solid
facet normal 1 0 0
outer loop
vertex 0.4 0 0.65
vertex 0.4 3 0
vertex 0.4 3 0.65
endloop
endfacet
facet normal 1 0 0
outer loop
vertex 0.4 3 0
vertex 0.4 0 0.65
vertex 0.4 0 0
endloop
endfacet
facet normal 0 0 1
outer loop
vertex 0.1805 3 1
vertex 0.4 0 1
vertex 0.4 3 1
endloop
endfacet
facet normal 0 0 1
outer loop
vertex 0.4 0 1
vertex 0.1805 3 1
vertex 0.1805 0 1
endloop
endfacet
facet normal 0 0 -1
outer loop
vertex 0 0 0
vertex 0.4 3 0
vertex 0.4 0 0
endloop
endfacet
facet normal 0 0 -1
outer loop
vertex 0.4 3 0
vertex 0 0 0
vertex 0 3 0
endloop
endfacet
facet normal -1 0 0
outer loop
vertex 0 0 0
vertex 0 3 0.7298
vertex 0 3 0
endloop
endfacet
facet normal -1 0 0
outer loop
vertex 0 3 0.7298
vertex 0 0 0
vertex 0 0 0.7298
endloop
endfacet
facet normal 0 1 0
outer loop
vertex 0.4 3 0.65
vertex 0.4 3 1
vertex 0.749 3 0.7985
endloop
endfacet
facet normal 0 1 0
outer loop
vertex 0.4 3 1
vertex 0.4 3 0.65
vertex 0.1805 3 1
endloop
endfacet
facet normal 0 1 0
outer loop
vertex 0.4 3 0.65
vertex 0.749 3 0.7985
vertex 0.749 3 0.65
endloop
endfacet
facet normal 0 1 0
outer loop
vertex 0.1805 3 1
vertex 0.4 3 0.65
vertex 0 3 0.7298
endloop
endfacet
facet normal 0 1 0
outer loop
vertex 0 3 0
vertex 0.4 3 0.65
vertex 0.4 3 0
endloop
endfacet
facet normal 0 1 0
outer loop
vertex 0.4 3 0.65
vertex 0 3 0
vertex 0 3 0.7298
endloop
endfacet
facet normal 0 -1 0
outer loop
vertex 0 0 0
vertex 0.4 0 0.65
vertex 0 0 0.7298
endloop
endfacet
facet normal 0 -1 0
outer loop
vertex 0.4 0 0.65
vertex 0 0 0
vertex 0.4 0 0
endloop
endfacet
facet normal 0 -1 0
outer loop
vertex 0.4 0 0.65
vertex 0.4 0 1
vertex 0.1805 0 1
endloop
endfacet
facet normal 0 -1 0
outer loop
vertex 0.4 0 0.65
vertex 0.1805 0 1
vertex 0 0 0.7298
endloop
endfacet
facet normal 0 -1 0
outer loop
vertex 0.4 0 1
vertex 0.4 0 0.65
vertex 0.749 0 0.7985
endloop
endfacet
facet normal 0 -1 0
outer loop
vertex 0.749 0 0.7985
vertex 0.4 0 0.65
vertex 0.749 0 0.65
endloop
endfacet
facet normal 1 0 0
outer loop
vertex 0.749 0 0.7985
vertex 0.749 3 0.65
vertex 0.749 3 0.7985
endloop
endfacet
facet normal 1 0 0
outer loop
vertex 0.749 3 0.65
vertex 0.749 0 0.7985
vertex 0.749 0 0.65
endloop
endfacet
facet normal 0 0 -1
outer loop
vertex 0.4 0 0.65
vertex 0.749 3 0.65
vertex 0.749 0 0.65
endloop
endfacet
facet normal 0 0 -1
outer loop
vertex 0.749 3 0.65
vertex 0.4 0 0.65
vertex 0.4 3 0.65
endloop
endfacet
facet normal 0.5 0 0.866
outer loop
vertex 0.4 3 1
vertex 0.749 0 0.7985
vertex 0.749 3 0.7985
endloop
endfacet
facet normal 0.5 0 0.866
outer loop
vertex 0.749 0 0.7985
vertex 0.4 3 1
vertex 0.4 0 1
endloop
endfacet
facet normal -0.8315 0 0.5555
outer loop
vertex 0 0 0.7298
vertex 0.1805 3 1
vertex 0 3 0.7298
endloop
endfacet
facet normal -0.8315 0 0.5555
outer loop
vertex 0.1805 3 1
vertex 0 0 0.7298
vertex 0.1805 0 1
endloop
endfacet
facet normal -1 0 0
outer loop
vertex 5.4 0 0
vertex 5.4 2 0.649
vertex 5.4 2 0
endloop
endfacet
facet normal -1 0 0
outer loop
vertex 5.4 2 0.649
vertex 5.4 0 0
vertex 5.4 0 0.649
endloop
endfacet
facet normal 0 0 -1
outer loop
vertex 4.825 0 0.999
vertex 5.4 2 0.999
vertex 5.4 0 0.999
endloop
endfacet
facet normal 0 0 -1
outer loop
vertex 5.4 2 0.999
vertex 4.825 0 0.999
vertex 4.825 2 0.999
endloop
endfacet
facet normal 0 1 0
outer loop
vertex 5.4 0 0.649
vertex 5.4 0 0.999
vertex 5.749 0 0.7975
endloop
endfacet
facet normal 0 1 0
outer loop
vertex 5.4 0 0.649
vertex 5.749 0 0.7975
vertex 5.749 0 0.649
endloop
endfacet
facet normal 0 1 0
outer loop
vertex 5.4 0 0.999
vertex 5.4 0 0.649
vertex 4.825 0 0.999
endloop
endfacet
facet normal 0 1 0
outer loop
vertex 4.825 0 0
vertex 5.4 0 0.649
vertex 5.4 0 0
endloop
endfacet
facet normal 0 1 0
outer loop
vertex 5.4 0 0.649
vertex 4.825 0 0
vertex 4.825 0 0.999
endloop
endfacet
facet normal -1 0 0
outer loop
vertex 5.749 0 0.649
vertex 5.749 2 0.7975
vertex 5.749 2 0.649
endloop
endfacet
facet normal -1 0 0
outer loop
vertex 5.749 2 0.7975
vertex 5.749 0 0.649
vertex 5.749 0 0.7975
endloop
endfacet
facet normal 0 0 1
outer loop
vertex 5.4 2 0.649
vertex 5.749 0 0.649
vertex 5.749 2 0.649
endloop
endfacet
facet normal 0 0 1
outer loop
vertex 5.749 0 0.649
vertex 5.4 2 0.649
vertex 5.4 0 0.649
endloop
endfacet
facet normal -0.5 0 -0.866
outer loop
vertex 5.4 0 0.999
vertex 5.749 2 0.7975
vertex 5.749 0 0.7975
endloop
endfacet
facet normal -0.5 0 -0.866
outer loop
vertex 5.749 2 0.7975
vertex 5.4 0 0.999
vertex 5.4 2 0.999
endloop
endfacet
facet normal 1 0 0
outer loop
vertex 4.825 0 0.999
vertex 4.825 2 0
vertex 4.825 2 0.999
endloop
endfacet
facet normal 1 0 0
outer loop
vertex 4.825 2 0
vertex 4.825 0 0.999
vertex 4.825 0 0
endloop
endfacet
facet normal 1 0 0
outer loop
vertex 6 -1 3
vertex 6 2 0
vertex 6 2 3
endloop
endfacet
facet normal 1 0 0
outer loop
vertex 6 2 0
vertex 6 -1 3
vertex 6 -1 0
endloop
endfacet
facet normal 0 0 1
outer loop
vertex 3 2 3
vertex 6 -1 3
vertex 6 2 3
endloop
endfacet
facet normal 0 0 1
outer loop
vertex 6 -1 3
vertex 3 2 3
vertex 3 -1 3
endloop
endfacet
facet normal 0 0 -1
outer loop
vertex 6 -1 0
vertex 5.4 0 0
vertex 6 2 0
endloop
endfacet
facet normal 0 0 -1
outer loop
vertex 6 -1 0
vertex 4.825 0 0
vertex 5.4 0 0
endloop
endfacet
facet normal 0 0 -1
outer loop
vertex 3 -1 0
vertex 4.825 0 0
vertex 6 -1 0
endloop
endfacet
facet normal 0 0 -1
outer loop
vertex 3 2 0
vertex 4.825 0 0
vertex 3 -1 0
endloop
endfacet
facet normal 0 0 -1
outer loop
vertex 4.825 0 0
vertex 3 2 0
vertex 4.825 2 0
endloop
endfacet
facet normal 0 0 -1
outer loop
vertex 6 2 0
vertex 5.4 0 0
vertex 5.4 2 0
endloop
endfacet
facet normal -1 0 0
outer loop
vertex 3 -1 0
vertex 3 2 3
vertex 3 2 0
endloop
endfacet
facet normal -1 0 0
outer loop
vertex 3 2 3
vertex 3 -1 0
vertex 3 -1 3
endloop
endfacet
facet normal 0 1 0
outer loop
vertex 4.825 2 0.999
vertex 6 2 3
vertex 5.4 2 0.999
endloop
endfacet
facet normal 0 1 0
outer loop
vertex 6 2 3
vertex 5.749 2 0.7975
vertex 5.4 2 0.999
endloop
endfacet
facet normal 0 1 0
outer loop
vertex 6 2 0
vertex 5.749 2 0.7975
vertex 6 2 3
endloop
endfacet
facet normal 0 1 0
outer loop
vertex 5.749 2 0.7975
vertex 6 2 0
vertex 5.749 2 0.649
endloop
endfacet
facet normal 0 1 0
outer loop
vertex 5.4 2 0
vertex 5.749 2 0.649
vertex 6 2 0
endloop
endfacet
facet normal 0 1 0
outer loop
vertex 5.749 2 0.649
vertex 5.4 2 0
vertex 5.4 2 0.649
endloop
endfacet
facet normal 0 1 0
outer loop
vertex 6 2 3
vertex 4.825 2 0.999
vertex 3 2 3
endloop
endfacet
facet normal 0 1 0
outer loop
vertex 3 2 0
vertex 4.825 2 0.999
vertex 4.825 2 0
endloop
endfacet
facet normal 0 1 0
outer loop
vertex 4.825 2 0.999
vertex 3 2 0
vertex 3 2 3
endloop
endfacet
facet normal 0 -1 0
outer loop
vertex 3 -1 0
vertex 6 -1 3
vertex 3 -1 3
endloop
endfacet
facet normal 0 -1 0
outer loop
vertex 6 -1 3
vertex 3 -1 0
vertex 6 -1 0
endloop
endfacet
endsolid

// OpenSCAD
RAD = 180 / PI;
DEG = 1;

$fs = 0.01; // min angle for curved shapes
$fa = 2; // min segment/fragment size


epsilon = 0.001;

module peg(socket=false) {
    peg_dim = [0.4, 3, 1];
    notch_size = 0.35;
    notch_width = notch_size/2;
    notch_dim = [notch_size, peg_dim[1], notch_size];
    
    if (socket) {        
        socket_extension = notch_width;
        translate([-socket_extension, 0,0]) scale([1+epsilon, 1, 1]) 
        difference() {
            cube([socket_extension, peg_dim[1], peg_dim[2]]);
            //bevel top outside corner on socket (which is offset, hence the duplication)
            //color("red") translate([-.06, peg_dim[1]/2-epsilon, peg_dim[2]]) rotate(3*PI/16*RAD, [0,1,0]) scale([1, 1+epsilon, 1])
            //    cube([.4, peg_dim[1], .4], center=true);
        }
    }
    
    // peg & notch
    difference() {
        union() {
            cube(peg_dim);
            translate([peg_dim[0] - epsilon, 0, peg_dim[2]-notch_dim[2]]) cube(notch_dim);
        }
        union() {
            translate([peg_dim[0], -epsilon, peg_dim[2]]) rotate(PI/6*RAD, [0,1,0]) scale([1,1+epsilon,1]) cube([1,notch_dim[1],1]);
            // bevel top outside corner on peg
            if (!socket) translate([-.06, peg_dim[1]/2-epsilon, peg_dim[2]]) rotate(3*PI/16*RAD, [0,1,0]) scale([1, 1+epsilon, 1])
                cube([.4, peg_dim[1], .4], center=true);
        }
    }
}

peg();
translate([5, 0, 0]) difference() {
    translate([-2, -1,0]) cube([3,3, 3]);
    translate([0,0,-epsilon]) peg(socket=true);
    
};
//color("blue") translate([5, 0, 0]) peg();
